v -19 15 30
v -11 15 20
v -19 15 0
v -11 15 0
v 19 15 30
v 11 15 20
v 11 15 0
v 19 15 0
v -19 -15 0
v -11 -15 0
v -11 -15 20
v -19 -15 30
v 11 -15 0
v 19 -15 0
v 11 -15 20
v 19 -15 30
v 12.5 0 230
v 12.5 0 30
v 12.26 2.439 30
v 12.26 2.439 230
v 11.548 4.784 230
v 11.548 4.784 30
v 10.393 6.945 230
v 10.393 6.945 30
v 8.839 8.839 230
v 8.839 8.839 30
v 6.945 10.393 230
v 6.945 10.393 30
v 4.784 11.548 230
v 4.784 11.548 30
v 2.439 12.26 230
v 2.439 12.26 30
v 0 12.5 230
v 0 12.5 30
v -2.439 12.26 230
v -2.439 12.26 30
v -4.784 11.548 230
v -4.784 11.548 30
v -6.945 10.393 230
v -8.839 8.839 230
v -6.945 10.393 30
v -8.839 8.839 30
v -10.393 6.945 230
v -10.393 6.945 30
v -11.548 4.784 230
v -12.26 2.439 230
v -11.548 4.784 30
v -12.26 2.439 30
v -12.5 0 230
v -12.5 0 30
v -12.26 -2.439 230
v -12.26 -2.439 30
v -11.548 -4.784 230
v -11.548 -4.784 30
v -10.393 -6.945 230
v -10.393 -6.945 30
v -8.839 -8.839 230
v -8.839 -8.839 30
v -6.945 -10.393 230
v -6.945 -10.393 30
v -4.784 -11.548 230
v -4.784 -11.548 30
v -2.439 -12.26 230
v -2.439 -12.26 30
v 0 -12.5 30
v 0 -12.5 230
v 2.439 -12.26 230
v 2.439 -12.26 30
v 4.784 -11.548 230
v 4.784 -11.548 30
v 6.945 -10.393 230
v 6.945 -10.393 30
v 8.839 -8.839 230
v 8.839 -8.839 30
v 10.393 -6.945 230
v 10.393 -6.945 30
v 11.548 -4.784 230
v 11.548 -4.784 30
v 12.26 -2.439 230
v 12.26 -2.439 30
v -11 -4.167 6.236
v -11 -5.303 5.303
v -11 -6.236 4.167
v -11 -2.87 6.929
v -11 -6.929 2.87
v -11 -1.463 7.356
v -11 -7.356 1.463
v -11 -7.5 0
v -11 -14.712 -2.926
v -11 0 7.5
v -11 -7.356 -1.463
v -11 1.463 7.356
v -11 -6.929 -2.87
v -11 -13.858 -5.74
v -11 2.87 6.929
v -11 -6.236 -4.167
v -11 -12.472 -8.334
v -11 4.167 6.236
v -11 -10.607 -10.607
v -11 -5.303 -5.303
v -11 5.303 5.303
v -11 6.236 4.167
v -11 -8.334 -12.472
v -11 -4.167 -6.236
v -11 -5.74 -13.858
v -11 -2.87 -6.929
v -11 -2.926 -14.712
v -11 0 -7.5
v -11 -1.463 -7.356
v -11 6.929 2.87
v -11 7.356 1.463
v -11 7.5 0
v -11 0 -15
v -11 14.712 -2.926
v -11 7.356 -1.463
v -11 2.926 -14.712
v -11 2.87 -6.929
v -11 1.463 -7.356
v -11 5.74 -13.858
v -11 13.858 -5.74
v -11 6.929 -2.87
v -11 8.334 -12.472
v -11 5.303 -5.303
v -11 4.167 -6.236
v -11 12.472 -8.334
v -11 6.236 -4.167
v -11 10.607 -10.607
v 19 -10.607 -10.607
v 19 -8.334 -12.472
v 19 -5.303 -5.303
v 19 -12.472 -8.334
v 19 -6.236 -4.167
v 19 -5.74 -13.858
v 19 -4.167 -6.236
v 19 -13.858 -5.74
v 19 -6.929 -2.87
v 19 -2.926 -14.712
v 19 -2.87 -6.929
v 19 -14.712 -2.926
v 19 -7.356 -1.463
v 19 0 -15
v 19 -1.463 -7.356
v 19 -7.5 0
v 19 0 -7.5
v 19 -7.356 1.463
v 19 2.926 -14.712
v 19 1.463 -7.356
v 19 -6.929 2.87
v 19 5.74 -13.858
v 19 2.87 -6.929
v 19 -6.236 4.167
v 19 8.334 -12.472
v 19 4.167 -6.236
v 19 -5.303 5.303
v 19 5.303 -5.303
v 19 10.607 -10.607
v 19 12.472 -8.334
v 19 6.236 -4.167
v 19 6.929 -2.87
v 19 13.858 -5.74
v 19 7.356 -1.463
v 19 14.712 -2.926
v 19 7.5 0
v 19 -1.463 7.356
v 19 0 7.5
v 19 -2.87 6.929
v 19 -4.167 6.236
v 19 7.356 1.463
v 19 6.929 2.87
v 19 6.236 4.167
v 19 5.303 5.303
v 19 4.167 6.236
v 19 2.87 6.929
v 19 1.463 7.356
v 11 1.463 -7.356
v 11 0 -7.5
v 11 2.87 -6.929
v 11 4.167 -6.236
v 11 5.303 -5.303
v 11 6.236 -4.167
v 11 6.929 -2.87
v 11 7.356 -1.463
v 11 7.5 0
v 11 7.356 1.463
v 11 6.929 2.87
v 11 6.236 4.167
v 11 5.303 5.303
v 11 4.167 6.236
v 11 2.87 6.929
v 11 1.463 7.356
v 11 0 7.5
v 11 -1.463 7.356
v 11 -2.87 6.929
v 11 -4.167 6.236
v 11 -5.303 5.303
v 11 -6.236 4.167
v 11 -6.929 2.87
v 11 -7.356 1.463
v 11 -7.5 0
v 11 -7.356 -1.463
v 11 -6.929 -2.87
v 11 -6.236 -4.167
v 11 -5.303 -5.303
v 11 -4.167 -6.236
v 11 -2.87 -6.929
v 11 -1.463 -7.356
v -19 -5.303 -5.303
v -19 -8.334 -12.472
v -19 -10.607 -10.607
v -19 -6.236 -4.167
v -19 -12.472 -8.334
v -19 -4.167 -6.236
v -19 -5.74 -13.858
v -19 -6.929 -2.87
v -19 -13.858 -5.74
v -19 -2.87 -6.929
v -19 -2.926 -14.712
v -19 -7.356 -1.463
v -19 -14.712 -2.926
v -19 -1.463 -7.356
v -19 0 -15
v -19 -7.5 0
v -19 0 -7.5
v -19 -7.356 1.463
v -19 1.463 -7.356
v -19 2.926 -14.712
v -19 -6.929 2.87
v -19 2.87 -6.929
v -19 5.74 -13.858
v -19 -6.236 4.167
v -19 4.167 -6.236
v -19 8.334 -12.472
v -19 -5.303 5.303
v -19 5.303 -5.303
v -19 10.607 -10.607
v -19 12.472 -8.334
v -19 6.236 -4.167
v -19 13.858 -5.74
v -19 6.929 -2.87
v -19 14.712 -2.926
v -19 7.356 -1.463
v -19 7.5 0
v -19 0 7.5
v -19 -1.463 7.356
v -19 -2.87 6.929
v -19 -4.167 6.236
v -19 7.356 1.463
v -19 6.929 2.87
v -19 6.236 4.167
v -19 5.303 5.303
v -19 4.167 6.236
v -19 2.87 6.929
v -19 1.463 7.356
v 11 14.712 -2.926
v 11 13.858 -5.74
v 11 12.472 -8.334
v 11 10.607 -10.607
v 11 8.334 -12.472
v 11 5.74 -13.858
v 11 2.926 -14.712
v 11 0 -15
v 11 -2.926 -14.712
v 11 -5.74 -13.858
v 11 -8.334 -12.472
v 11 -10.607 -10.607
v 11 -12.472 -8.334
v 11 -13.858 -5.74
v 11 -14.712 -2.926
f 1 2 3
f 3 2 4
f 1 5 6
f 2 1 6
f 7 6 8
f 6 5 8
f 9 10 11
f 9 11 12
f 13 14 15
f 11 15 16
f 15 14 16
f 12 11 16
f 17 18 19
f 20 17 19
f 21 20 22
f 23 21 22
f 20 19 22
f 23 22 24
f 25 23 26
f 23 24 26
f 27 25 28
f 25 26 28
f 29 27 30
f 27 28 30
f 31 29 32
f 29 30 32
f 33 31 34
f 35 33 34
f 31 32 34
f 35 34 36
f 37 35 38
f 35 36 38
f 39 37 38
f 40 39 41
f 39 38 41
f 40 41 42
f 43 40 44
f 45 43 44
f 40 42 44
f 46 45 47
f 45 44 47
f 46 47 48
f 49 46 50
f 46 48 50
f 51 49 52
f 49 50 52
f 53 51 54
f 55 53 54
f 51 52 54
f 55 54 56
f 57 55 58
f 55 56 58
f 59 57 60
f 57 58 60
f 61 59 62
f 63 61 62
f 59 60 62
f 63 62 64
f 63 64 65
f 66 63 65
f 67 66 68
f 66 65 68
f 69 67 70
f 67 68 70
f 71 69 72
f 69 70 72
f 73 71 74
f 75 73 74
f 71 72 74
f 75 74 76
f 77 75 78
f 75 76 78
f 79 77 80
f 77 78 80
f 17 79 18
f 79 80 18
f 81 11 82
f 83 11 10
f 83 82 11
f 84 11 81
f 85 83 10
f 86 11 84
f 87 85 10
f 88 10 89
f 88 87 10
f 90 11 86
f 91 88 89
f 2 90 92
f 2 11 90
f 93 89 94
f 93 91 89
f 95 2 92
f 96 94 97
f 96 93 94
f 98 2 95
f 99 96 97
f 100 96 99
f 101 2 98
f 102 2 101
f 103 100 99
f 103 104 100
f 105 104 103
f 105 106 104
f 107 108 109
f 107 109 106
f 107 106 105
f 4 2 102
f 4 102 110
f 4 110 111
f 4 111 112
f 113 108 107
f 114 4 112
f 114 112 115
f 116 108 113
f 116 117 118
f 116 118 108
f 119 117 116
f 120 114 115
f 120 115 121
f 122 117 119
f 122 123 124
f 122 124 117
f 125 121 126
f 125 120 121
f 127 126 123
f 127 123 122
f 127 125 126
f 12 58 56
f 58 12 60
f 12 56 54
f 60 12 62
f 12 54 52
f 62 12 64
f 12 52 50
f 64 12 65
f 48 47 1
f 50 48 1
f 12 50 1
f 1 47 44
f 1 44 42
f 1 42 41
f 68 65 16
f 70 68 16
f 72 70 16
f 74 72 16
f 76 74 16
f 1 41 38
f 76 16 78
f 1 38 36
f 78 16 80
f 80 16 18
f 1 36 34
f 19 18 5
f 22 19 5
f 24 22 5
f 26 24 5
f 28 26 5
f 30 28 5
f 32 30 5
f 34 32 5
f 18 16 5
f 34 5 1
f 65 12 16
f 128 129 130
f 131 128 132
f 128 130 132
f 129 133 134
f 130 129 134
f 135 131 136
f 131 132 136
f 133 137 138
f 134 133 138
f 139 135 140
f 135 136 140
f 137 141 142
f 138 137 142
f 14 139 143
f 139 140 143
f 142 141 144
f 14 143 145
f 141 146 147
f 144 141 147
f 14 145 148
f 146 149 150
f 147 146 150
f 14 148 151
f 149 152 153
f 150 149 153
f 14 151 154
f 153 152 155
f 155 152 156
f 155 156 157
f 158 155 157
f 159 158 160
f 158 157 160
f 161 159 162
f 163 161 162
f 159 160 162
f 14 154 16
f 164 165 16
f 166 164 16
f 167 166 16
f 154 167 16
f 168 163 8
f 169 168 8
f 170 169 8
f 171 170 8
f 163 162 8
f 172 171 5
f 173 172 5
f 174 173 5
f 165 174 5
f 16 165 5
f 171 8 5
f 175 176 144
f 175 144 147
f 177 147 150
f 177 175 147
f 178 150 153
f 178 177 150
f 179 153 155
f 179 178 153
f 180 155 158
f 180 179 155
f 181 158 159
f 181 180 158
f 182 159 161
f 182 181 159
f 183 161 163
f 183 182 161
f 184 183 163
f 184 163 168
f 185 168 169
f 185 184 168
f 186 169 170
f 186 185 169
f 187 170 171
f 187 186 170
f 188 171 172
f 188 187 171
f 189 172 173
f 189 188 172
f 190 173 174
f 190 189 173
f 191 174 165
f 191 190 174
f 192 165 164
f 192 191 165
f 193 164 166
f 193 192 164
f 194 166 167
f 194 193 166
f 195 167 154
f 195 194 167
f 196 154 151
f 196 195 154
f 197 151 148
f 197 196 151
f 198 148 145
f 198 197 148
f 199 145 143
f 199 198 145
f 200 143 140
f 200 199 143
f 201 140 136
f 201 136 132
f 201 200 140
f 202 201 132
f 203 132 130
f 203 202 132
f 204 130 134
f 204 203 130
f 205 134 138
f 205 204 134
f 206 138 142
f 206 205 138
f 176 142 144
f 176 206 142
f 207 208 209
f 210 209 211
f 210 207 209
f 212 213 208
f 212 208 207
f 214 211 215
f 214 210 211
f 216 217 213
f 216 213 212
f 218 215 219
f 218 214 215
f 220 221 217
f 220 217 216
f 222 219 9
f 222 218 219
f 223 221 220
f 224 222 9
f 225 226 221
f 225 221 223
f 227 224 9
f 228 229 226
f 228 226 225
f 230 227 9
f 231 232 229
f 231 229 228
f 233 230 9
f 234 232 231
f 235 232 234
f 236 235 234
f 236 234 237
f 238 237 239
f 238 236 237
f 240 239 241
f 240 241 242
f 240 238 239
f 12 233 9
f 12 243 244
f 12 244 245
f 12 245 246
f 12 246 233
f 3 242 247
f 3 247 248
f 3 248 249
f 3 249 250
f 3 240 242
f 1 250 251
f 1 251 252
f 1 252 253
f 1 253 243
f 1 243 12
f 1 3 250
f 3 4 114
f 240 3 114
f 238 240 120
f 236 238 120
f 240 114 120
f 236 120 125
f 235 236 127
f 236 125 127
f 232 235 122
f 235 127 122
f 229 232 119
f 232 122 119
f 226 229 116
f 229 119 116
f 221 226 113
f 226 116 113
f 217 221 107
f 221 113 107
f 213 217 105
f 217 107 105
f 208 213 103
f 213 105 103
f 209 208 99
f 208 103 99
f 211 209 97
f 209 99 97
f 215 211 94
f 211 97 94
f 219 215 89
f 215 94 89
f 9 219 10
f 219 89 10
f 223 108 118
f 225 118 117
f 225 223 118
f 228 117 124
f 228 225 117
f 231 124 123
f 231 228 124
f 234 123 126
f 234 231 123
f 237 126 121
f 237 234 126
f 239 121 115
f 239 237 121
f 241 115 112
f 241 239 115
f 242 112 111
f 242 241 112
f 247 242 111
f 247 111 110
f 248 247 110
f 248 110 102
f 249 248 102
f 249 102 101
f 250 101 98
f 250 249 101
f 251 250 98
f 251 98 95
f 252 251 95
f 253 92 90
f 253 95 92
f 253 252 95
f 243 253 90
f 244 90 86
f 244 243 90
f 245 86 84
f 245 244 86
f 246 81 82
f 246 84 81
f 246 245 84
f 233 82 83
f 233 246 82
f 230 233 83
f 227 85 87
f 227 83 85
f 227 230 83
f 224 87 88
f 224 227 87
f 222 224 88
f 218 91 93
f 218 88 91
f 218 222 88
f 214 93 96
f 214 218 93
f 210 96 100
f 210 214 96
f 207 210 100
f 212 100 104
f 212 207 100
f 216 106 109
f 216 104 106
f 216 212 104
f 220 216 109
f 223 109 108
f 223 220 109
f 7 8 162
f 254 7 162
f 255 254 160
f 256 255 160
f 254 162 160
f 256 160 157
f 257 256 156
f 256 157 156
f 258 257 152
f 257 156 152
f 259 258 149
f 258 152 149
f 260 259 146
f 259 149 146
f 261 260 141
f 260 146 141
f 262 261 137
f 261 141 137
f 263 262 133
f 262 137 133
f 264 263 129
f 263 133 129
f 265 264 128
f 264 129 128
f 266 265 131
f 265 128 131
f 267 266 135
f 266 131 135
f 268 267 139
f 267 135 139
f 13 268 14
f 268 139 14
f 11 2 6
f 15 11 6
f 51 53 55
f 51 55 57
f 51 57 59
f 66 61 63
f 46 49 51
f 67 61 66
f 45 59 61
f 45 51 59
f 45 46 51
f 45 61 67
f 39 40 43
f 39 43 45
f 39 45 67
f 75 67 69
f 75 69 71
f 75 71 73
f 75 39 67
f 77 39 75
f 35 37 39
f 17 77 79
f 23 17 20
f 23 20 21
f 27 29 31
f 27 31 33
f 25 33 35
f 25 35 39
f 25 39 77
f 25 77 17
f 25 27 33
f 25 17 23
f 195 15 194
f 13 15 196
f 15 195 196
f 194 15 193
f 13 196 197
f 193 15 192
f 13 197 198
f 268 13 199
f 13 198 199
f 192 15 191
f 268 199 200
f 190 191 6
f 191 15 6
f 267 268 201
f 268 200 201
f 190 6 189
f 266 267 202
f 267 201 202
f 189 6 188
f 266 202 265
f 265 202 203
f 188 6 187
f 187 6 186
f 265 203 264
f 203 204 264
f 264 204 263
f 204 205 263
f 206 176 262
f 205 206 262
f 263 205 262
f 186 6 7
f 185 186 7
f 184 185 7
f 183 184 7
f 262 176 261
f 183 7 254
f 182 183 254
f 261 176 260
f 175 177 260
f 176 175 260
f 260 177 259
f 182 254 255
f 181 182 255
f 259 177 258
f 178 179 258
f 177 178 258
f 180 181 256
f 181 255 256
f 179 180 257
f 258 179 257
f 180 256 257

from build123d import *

# Parameters (mm, degrees)
SKETCH_1_R          = 7.5
EXTRUDE_1_DEPTH     = 19
SKETCH_2_W          = 22
SKETCH_2_H          = 35
CUT_EXTRUDE_1_DEPTH = 47.486557197
SKETCH_4_R          = 12.5
EXTRUDE_2_DEPTH     = 200


with BuildPart() as part:
    # 草图1 → 凸台-拉伸1 (new, symmetric)
    with BuildSketch(Plane(origin=(0, 0, 0), x_dir=(0, 0, -1), z_dir=(1, 0, 0))):
        with BuildLine():
            Line((0, -15), (-30, -15))
            Line((-30, -15), (-30, 15))
            Line((-30, 15), (0, 15))
            ThreePointArc((0, 15), (15, 0), (0, -15))
        make_face()
        Circle(SKETCH_1_R, mode=Mode.SUBTRACT)
    extrude(amount=EXTRUDE_1_DEPTH, both=True)

    # 草图2 → 切除-拉伸1 (cut, through all)
    with BuildSketch(Plane(origin=(0, 15, 0), x_dir=(1, 0, 0), z_dir=(0, 1, 0))):
        with Locations((0, -2.5)):
            Rectangle(SKETCH_2_W, SKETCH_2_H)
    extrude(amount=-CUT_EXTRUDE_1_DEPTH, mode=Mode.SUBTRACT)

    # 草图4 → 凸台-拉伸2 (add)
    with BuildSketch(Plane.XY.offset(30)):
        Circle(SKETCH_4_R)
    extrude(amount=EXTRUDE_2_DEPTH)


solid = part.part
